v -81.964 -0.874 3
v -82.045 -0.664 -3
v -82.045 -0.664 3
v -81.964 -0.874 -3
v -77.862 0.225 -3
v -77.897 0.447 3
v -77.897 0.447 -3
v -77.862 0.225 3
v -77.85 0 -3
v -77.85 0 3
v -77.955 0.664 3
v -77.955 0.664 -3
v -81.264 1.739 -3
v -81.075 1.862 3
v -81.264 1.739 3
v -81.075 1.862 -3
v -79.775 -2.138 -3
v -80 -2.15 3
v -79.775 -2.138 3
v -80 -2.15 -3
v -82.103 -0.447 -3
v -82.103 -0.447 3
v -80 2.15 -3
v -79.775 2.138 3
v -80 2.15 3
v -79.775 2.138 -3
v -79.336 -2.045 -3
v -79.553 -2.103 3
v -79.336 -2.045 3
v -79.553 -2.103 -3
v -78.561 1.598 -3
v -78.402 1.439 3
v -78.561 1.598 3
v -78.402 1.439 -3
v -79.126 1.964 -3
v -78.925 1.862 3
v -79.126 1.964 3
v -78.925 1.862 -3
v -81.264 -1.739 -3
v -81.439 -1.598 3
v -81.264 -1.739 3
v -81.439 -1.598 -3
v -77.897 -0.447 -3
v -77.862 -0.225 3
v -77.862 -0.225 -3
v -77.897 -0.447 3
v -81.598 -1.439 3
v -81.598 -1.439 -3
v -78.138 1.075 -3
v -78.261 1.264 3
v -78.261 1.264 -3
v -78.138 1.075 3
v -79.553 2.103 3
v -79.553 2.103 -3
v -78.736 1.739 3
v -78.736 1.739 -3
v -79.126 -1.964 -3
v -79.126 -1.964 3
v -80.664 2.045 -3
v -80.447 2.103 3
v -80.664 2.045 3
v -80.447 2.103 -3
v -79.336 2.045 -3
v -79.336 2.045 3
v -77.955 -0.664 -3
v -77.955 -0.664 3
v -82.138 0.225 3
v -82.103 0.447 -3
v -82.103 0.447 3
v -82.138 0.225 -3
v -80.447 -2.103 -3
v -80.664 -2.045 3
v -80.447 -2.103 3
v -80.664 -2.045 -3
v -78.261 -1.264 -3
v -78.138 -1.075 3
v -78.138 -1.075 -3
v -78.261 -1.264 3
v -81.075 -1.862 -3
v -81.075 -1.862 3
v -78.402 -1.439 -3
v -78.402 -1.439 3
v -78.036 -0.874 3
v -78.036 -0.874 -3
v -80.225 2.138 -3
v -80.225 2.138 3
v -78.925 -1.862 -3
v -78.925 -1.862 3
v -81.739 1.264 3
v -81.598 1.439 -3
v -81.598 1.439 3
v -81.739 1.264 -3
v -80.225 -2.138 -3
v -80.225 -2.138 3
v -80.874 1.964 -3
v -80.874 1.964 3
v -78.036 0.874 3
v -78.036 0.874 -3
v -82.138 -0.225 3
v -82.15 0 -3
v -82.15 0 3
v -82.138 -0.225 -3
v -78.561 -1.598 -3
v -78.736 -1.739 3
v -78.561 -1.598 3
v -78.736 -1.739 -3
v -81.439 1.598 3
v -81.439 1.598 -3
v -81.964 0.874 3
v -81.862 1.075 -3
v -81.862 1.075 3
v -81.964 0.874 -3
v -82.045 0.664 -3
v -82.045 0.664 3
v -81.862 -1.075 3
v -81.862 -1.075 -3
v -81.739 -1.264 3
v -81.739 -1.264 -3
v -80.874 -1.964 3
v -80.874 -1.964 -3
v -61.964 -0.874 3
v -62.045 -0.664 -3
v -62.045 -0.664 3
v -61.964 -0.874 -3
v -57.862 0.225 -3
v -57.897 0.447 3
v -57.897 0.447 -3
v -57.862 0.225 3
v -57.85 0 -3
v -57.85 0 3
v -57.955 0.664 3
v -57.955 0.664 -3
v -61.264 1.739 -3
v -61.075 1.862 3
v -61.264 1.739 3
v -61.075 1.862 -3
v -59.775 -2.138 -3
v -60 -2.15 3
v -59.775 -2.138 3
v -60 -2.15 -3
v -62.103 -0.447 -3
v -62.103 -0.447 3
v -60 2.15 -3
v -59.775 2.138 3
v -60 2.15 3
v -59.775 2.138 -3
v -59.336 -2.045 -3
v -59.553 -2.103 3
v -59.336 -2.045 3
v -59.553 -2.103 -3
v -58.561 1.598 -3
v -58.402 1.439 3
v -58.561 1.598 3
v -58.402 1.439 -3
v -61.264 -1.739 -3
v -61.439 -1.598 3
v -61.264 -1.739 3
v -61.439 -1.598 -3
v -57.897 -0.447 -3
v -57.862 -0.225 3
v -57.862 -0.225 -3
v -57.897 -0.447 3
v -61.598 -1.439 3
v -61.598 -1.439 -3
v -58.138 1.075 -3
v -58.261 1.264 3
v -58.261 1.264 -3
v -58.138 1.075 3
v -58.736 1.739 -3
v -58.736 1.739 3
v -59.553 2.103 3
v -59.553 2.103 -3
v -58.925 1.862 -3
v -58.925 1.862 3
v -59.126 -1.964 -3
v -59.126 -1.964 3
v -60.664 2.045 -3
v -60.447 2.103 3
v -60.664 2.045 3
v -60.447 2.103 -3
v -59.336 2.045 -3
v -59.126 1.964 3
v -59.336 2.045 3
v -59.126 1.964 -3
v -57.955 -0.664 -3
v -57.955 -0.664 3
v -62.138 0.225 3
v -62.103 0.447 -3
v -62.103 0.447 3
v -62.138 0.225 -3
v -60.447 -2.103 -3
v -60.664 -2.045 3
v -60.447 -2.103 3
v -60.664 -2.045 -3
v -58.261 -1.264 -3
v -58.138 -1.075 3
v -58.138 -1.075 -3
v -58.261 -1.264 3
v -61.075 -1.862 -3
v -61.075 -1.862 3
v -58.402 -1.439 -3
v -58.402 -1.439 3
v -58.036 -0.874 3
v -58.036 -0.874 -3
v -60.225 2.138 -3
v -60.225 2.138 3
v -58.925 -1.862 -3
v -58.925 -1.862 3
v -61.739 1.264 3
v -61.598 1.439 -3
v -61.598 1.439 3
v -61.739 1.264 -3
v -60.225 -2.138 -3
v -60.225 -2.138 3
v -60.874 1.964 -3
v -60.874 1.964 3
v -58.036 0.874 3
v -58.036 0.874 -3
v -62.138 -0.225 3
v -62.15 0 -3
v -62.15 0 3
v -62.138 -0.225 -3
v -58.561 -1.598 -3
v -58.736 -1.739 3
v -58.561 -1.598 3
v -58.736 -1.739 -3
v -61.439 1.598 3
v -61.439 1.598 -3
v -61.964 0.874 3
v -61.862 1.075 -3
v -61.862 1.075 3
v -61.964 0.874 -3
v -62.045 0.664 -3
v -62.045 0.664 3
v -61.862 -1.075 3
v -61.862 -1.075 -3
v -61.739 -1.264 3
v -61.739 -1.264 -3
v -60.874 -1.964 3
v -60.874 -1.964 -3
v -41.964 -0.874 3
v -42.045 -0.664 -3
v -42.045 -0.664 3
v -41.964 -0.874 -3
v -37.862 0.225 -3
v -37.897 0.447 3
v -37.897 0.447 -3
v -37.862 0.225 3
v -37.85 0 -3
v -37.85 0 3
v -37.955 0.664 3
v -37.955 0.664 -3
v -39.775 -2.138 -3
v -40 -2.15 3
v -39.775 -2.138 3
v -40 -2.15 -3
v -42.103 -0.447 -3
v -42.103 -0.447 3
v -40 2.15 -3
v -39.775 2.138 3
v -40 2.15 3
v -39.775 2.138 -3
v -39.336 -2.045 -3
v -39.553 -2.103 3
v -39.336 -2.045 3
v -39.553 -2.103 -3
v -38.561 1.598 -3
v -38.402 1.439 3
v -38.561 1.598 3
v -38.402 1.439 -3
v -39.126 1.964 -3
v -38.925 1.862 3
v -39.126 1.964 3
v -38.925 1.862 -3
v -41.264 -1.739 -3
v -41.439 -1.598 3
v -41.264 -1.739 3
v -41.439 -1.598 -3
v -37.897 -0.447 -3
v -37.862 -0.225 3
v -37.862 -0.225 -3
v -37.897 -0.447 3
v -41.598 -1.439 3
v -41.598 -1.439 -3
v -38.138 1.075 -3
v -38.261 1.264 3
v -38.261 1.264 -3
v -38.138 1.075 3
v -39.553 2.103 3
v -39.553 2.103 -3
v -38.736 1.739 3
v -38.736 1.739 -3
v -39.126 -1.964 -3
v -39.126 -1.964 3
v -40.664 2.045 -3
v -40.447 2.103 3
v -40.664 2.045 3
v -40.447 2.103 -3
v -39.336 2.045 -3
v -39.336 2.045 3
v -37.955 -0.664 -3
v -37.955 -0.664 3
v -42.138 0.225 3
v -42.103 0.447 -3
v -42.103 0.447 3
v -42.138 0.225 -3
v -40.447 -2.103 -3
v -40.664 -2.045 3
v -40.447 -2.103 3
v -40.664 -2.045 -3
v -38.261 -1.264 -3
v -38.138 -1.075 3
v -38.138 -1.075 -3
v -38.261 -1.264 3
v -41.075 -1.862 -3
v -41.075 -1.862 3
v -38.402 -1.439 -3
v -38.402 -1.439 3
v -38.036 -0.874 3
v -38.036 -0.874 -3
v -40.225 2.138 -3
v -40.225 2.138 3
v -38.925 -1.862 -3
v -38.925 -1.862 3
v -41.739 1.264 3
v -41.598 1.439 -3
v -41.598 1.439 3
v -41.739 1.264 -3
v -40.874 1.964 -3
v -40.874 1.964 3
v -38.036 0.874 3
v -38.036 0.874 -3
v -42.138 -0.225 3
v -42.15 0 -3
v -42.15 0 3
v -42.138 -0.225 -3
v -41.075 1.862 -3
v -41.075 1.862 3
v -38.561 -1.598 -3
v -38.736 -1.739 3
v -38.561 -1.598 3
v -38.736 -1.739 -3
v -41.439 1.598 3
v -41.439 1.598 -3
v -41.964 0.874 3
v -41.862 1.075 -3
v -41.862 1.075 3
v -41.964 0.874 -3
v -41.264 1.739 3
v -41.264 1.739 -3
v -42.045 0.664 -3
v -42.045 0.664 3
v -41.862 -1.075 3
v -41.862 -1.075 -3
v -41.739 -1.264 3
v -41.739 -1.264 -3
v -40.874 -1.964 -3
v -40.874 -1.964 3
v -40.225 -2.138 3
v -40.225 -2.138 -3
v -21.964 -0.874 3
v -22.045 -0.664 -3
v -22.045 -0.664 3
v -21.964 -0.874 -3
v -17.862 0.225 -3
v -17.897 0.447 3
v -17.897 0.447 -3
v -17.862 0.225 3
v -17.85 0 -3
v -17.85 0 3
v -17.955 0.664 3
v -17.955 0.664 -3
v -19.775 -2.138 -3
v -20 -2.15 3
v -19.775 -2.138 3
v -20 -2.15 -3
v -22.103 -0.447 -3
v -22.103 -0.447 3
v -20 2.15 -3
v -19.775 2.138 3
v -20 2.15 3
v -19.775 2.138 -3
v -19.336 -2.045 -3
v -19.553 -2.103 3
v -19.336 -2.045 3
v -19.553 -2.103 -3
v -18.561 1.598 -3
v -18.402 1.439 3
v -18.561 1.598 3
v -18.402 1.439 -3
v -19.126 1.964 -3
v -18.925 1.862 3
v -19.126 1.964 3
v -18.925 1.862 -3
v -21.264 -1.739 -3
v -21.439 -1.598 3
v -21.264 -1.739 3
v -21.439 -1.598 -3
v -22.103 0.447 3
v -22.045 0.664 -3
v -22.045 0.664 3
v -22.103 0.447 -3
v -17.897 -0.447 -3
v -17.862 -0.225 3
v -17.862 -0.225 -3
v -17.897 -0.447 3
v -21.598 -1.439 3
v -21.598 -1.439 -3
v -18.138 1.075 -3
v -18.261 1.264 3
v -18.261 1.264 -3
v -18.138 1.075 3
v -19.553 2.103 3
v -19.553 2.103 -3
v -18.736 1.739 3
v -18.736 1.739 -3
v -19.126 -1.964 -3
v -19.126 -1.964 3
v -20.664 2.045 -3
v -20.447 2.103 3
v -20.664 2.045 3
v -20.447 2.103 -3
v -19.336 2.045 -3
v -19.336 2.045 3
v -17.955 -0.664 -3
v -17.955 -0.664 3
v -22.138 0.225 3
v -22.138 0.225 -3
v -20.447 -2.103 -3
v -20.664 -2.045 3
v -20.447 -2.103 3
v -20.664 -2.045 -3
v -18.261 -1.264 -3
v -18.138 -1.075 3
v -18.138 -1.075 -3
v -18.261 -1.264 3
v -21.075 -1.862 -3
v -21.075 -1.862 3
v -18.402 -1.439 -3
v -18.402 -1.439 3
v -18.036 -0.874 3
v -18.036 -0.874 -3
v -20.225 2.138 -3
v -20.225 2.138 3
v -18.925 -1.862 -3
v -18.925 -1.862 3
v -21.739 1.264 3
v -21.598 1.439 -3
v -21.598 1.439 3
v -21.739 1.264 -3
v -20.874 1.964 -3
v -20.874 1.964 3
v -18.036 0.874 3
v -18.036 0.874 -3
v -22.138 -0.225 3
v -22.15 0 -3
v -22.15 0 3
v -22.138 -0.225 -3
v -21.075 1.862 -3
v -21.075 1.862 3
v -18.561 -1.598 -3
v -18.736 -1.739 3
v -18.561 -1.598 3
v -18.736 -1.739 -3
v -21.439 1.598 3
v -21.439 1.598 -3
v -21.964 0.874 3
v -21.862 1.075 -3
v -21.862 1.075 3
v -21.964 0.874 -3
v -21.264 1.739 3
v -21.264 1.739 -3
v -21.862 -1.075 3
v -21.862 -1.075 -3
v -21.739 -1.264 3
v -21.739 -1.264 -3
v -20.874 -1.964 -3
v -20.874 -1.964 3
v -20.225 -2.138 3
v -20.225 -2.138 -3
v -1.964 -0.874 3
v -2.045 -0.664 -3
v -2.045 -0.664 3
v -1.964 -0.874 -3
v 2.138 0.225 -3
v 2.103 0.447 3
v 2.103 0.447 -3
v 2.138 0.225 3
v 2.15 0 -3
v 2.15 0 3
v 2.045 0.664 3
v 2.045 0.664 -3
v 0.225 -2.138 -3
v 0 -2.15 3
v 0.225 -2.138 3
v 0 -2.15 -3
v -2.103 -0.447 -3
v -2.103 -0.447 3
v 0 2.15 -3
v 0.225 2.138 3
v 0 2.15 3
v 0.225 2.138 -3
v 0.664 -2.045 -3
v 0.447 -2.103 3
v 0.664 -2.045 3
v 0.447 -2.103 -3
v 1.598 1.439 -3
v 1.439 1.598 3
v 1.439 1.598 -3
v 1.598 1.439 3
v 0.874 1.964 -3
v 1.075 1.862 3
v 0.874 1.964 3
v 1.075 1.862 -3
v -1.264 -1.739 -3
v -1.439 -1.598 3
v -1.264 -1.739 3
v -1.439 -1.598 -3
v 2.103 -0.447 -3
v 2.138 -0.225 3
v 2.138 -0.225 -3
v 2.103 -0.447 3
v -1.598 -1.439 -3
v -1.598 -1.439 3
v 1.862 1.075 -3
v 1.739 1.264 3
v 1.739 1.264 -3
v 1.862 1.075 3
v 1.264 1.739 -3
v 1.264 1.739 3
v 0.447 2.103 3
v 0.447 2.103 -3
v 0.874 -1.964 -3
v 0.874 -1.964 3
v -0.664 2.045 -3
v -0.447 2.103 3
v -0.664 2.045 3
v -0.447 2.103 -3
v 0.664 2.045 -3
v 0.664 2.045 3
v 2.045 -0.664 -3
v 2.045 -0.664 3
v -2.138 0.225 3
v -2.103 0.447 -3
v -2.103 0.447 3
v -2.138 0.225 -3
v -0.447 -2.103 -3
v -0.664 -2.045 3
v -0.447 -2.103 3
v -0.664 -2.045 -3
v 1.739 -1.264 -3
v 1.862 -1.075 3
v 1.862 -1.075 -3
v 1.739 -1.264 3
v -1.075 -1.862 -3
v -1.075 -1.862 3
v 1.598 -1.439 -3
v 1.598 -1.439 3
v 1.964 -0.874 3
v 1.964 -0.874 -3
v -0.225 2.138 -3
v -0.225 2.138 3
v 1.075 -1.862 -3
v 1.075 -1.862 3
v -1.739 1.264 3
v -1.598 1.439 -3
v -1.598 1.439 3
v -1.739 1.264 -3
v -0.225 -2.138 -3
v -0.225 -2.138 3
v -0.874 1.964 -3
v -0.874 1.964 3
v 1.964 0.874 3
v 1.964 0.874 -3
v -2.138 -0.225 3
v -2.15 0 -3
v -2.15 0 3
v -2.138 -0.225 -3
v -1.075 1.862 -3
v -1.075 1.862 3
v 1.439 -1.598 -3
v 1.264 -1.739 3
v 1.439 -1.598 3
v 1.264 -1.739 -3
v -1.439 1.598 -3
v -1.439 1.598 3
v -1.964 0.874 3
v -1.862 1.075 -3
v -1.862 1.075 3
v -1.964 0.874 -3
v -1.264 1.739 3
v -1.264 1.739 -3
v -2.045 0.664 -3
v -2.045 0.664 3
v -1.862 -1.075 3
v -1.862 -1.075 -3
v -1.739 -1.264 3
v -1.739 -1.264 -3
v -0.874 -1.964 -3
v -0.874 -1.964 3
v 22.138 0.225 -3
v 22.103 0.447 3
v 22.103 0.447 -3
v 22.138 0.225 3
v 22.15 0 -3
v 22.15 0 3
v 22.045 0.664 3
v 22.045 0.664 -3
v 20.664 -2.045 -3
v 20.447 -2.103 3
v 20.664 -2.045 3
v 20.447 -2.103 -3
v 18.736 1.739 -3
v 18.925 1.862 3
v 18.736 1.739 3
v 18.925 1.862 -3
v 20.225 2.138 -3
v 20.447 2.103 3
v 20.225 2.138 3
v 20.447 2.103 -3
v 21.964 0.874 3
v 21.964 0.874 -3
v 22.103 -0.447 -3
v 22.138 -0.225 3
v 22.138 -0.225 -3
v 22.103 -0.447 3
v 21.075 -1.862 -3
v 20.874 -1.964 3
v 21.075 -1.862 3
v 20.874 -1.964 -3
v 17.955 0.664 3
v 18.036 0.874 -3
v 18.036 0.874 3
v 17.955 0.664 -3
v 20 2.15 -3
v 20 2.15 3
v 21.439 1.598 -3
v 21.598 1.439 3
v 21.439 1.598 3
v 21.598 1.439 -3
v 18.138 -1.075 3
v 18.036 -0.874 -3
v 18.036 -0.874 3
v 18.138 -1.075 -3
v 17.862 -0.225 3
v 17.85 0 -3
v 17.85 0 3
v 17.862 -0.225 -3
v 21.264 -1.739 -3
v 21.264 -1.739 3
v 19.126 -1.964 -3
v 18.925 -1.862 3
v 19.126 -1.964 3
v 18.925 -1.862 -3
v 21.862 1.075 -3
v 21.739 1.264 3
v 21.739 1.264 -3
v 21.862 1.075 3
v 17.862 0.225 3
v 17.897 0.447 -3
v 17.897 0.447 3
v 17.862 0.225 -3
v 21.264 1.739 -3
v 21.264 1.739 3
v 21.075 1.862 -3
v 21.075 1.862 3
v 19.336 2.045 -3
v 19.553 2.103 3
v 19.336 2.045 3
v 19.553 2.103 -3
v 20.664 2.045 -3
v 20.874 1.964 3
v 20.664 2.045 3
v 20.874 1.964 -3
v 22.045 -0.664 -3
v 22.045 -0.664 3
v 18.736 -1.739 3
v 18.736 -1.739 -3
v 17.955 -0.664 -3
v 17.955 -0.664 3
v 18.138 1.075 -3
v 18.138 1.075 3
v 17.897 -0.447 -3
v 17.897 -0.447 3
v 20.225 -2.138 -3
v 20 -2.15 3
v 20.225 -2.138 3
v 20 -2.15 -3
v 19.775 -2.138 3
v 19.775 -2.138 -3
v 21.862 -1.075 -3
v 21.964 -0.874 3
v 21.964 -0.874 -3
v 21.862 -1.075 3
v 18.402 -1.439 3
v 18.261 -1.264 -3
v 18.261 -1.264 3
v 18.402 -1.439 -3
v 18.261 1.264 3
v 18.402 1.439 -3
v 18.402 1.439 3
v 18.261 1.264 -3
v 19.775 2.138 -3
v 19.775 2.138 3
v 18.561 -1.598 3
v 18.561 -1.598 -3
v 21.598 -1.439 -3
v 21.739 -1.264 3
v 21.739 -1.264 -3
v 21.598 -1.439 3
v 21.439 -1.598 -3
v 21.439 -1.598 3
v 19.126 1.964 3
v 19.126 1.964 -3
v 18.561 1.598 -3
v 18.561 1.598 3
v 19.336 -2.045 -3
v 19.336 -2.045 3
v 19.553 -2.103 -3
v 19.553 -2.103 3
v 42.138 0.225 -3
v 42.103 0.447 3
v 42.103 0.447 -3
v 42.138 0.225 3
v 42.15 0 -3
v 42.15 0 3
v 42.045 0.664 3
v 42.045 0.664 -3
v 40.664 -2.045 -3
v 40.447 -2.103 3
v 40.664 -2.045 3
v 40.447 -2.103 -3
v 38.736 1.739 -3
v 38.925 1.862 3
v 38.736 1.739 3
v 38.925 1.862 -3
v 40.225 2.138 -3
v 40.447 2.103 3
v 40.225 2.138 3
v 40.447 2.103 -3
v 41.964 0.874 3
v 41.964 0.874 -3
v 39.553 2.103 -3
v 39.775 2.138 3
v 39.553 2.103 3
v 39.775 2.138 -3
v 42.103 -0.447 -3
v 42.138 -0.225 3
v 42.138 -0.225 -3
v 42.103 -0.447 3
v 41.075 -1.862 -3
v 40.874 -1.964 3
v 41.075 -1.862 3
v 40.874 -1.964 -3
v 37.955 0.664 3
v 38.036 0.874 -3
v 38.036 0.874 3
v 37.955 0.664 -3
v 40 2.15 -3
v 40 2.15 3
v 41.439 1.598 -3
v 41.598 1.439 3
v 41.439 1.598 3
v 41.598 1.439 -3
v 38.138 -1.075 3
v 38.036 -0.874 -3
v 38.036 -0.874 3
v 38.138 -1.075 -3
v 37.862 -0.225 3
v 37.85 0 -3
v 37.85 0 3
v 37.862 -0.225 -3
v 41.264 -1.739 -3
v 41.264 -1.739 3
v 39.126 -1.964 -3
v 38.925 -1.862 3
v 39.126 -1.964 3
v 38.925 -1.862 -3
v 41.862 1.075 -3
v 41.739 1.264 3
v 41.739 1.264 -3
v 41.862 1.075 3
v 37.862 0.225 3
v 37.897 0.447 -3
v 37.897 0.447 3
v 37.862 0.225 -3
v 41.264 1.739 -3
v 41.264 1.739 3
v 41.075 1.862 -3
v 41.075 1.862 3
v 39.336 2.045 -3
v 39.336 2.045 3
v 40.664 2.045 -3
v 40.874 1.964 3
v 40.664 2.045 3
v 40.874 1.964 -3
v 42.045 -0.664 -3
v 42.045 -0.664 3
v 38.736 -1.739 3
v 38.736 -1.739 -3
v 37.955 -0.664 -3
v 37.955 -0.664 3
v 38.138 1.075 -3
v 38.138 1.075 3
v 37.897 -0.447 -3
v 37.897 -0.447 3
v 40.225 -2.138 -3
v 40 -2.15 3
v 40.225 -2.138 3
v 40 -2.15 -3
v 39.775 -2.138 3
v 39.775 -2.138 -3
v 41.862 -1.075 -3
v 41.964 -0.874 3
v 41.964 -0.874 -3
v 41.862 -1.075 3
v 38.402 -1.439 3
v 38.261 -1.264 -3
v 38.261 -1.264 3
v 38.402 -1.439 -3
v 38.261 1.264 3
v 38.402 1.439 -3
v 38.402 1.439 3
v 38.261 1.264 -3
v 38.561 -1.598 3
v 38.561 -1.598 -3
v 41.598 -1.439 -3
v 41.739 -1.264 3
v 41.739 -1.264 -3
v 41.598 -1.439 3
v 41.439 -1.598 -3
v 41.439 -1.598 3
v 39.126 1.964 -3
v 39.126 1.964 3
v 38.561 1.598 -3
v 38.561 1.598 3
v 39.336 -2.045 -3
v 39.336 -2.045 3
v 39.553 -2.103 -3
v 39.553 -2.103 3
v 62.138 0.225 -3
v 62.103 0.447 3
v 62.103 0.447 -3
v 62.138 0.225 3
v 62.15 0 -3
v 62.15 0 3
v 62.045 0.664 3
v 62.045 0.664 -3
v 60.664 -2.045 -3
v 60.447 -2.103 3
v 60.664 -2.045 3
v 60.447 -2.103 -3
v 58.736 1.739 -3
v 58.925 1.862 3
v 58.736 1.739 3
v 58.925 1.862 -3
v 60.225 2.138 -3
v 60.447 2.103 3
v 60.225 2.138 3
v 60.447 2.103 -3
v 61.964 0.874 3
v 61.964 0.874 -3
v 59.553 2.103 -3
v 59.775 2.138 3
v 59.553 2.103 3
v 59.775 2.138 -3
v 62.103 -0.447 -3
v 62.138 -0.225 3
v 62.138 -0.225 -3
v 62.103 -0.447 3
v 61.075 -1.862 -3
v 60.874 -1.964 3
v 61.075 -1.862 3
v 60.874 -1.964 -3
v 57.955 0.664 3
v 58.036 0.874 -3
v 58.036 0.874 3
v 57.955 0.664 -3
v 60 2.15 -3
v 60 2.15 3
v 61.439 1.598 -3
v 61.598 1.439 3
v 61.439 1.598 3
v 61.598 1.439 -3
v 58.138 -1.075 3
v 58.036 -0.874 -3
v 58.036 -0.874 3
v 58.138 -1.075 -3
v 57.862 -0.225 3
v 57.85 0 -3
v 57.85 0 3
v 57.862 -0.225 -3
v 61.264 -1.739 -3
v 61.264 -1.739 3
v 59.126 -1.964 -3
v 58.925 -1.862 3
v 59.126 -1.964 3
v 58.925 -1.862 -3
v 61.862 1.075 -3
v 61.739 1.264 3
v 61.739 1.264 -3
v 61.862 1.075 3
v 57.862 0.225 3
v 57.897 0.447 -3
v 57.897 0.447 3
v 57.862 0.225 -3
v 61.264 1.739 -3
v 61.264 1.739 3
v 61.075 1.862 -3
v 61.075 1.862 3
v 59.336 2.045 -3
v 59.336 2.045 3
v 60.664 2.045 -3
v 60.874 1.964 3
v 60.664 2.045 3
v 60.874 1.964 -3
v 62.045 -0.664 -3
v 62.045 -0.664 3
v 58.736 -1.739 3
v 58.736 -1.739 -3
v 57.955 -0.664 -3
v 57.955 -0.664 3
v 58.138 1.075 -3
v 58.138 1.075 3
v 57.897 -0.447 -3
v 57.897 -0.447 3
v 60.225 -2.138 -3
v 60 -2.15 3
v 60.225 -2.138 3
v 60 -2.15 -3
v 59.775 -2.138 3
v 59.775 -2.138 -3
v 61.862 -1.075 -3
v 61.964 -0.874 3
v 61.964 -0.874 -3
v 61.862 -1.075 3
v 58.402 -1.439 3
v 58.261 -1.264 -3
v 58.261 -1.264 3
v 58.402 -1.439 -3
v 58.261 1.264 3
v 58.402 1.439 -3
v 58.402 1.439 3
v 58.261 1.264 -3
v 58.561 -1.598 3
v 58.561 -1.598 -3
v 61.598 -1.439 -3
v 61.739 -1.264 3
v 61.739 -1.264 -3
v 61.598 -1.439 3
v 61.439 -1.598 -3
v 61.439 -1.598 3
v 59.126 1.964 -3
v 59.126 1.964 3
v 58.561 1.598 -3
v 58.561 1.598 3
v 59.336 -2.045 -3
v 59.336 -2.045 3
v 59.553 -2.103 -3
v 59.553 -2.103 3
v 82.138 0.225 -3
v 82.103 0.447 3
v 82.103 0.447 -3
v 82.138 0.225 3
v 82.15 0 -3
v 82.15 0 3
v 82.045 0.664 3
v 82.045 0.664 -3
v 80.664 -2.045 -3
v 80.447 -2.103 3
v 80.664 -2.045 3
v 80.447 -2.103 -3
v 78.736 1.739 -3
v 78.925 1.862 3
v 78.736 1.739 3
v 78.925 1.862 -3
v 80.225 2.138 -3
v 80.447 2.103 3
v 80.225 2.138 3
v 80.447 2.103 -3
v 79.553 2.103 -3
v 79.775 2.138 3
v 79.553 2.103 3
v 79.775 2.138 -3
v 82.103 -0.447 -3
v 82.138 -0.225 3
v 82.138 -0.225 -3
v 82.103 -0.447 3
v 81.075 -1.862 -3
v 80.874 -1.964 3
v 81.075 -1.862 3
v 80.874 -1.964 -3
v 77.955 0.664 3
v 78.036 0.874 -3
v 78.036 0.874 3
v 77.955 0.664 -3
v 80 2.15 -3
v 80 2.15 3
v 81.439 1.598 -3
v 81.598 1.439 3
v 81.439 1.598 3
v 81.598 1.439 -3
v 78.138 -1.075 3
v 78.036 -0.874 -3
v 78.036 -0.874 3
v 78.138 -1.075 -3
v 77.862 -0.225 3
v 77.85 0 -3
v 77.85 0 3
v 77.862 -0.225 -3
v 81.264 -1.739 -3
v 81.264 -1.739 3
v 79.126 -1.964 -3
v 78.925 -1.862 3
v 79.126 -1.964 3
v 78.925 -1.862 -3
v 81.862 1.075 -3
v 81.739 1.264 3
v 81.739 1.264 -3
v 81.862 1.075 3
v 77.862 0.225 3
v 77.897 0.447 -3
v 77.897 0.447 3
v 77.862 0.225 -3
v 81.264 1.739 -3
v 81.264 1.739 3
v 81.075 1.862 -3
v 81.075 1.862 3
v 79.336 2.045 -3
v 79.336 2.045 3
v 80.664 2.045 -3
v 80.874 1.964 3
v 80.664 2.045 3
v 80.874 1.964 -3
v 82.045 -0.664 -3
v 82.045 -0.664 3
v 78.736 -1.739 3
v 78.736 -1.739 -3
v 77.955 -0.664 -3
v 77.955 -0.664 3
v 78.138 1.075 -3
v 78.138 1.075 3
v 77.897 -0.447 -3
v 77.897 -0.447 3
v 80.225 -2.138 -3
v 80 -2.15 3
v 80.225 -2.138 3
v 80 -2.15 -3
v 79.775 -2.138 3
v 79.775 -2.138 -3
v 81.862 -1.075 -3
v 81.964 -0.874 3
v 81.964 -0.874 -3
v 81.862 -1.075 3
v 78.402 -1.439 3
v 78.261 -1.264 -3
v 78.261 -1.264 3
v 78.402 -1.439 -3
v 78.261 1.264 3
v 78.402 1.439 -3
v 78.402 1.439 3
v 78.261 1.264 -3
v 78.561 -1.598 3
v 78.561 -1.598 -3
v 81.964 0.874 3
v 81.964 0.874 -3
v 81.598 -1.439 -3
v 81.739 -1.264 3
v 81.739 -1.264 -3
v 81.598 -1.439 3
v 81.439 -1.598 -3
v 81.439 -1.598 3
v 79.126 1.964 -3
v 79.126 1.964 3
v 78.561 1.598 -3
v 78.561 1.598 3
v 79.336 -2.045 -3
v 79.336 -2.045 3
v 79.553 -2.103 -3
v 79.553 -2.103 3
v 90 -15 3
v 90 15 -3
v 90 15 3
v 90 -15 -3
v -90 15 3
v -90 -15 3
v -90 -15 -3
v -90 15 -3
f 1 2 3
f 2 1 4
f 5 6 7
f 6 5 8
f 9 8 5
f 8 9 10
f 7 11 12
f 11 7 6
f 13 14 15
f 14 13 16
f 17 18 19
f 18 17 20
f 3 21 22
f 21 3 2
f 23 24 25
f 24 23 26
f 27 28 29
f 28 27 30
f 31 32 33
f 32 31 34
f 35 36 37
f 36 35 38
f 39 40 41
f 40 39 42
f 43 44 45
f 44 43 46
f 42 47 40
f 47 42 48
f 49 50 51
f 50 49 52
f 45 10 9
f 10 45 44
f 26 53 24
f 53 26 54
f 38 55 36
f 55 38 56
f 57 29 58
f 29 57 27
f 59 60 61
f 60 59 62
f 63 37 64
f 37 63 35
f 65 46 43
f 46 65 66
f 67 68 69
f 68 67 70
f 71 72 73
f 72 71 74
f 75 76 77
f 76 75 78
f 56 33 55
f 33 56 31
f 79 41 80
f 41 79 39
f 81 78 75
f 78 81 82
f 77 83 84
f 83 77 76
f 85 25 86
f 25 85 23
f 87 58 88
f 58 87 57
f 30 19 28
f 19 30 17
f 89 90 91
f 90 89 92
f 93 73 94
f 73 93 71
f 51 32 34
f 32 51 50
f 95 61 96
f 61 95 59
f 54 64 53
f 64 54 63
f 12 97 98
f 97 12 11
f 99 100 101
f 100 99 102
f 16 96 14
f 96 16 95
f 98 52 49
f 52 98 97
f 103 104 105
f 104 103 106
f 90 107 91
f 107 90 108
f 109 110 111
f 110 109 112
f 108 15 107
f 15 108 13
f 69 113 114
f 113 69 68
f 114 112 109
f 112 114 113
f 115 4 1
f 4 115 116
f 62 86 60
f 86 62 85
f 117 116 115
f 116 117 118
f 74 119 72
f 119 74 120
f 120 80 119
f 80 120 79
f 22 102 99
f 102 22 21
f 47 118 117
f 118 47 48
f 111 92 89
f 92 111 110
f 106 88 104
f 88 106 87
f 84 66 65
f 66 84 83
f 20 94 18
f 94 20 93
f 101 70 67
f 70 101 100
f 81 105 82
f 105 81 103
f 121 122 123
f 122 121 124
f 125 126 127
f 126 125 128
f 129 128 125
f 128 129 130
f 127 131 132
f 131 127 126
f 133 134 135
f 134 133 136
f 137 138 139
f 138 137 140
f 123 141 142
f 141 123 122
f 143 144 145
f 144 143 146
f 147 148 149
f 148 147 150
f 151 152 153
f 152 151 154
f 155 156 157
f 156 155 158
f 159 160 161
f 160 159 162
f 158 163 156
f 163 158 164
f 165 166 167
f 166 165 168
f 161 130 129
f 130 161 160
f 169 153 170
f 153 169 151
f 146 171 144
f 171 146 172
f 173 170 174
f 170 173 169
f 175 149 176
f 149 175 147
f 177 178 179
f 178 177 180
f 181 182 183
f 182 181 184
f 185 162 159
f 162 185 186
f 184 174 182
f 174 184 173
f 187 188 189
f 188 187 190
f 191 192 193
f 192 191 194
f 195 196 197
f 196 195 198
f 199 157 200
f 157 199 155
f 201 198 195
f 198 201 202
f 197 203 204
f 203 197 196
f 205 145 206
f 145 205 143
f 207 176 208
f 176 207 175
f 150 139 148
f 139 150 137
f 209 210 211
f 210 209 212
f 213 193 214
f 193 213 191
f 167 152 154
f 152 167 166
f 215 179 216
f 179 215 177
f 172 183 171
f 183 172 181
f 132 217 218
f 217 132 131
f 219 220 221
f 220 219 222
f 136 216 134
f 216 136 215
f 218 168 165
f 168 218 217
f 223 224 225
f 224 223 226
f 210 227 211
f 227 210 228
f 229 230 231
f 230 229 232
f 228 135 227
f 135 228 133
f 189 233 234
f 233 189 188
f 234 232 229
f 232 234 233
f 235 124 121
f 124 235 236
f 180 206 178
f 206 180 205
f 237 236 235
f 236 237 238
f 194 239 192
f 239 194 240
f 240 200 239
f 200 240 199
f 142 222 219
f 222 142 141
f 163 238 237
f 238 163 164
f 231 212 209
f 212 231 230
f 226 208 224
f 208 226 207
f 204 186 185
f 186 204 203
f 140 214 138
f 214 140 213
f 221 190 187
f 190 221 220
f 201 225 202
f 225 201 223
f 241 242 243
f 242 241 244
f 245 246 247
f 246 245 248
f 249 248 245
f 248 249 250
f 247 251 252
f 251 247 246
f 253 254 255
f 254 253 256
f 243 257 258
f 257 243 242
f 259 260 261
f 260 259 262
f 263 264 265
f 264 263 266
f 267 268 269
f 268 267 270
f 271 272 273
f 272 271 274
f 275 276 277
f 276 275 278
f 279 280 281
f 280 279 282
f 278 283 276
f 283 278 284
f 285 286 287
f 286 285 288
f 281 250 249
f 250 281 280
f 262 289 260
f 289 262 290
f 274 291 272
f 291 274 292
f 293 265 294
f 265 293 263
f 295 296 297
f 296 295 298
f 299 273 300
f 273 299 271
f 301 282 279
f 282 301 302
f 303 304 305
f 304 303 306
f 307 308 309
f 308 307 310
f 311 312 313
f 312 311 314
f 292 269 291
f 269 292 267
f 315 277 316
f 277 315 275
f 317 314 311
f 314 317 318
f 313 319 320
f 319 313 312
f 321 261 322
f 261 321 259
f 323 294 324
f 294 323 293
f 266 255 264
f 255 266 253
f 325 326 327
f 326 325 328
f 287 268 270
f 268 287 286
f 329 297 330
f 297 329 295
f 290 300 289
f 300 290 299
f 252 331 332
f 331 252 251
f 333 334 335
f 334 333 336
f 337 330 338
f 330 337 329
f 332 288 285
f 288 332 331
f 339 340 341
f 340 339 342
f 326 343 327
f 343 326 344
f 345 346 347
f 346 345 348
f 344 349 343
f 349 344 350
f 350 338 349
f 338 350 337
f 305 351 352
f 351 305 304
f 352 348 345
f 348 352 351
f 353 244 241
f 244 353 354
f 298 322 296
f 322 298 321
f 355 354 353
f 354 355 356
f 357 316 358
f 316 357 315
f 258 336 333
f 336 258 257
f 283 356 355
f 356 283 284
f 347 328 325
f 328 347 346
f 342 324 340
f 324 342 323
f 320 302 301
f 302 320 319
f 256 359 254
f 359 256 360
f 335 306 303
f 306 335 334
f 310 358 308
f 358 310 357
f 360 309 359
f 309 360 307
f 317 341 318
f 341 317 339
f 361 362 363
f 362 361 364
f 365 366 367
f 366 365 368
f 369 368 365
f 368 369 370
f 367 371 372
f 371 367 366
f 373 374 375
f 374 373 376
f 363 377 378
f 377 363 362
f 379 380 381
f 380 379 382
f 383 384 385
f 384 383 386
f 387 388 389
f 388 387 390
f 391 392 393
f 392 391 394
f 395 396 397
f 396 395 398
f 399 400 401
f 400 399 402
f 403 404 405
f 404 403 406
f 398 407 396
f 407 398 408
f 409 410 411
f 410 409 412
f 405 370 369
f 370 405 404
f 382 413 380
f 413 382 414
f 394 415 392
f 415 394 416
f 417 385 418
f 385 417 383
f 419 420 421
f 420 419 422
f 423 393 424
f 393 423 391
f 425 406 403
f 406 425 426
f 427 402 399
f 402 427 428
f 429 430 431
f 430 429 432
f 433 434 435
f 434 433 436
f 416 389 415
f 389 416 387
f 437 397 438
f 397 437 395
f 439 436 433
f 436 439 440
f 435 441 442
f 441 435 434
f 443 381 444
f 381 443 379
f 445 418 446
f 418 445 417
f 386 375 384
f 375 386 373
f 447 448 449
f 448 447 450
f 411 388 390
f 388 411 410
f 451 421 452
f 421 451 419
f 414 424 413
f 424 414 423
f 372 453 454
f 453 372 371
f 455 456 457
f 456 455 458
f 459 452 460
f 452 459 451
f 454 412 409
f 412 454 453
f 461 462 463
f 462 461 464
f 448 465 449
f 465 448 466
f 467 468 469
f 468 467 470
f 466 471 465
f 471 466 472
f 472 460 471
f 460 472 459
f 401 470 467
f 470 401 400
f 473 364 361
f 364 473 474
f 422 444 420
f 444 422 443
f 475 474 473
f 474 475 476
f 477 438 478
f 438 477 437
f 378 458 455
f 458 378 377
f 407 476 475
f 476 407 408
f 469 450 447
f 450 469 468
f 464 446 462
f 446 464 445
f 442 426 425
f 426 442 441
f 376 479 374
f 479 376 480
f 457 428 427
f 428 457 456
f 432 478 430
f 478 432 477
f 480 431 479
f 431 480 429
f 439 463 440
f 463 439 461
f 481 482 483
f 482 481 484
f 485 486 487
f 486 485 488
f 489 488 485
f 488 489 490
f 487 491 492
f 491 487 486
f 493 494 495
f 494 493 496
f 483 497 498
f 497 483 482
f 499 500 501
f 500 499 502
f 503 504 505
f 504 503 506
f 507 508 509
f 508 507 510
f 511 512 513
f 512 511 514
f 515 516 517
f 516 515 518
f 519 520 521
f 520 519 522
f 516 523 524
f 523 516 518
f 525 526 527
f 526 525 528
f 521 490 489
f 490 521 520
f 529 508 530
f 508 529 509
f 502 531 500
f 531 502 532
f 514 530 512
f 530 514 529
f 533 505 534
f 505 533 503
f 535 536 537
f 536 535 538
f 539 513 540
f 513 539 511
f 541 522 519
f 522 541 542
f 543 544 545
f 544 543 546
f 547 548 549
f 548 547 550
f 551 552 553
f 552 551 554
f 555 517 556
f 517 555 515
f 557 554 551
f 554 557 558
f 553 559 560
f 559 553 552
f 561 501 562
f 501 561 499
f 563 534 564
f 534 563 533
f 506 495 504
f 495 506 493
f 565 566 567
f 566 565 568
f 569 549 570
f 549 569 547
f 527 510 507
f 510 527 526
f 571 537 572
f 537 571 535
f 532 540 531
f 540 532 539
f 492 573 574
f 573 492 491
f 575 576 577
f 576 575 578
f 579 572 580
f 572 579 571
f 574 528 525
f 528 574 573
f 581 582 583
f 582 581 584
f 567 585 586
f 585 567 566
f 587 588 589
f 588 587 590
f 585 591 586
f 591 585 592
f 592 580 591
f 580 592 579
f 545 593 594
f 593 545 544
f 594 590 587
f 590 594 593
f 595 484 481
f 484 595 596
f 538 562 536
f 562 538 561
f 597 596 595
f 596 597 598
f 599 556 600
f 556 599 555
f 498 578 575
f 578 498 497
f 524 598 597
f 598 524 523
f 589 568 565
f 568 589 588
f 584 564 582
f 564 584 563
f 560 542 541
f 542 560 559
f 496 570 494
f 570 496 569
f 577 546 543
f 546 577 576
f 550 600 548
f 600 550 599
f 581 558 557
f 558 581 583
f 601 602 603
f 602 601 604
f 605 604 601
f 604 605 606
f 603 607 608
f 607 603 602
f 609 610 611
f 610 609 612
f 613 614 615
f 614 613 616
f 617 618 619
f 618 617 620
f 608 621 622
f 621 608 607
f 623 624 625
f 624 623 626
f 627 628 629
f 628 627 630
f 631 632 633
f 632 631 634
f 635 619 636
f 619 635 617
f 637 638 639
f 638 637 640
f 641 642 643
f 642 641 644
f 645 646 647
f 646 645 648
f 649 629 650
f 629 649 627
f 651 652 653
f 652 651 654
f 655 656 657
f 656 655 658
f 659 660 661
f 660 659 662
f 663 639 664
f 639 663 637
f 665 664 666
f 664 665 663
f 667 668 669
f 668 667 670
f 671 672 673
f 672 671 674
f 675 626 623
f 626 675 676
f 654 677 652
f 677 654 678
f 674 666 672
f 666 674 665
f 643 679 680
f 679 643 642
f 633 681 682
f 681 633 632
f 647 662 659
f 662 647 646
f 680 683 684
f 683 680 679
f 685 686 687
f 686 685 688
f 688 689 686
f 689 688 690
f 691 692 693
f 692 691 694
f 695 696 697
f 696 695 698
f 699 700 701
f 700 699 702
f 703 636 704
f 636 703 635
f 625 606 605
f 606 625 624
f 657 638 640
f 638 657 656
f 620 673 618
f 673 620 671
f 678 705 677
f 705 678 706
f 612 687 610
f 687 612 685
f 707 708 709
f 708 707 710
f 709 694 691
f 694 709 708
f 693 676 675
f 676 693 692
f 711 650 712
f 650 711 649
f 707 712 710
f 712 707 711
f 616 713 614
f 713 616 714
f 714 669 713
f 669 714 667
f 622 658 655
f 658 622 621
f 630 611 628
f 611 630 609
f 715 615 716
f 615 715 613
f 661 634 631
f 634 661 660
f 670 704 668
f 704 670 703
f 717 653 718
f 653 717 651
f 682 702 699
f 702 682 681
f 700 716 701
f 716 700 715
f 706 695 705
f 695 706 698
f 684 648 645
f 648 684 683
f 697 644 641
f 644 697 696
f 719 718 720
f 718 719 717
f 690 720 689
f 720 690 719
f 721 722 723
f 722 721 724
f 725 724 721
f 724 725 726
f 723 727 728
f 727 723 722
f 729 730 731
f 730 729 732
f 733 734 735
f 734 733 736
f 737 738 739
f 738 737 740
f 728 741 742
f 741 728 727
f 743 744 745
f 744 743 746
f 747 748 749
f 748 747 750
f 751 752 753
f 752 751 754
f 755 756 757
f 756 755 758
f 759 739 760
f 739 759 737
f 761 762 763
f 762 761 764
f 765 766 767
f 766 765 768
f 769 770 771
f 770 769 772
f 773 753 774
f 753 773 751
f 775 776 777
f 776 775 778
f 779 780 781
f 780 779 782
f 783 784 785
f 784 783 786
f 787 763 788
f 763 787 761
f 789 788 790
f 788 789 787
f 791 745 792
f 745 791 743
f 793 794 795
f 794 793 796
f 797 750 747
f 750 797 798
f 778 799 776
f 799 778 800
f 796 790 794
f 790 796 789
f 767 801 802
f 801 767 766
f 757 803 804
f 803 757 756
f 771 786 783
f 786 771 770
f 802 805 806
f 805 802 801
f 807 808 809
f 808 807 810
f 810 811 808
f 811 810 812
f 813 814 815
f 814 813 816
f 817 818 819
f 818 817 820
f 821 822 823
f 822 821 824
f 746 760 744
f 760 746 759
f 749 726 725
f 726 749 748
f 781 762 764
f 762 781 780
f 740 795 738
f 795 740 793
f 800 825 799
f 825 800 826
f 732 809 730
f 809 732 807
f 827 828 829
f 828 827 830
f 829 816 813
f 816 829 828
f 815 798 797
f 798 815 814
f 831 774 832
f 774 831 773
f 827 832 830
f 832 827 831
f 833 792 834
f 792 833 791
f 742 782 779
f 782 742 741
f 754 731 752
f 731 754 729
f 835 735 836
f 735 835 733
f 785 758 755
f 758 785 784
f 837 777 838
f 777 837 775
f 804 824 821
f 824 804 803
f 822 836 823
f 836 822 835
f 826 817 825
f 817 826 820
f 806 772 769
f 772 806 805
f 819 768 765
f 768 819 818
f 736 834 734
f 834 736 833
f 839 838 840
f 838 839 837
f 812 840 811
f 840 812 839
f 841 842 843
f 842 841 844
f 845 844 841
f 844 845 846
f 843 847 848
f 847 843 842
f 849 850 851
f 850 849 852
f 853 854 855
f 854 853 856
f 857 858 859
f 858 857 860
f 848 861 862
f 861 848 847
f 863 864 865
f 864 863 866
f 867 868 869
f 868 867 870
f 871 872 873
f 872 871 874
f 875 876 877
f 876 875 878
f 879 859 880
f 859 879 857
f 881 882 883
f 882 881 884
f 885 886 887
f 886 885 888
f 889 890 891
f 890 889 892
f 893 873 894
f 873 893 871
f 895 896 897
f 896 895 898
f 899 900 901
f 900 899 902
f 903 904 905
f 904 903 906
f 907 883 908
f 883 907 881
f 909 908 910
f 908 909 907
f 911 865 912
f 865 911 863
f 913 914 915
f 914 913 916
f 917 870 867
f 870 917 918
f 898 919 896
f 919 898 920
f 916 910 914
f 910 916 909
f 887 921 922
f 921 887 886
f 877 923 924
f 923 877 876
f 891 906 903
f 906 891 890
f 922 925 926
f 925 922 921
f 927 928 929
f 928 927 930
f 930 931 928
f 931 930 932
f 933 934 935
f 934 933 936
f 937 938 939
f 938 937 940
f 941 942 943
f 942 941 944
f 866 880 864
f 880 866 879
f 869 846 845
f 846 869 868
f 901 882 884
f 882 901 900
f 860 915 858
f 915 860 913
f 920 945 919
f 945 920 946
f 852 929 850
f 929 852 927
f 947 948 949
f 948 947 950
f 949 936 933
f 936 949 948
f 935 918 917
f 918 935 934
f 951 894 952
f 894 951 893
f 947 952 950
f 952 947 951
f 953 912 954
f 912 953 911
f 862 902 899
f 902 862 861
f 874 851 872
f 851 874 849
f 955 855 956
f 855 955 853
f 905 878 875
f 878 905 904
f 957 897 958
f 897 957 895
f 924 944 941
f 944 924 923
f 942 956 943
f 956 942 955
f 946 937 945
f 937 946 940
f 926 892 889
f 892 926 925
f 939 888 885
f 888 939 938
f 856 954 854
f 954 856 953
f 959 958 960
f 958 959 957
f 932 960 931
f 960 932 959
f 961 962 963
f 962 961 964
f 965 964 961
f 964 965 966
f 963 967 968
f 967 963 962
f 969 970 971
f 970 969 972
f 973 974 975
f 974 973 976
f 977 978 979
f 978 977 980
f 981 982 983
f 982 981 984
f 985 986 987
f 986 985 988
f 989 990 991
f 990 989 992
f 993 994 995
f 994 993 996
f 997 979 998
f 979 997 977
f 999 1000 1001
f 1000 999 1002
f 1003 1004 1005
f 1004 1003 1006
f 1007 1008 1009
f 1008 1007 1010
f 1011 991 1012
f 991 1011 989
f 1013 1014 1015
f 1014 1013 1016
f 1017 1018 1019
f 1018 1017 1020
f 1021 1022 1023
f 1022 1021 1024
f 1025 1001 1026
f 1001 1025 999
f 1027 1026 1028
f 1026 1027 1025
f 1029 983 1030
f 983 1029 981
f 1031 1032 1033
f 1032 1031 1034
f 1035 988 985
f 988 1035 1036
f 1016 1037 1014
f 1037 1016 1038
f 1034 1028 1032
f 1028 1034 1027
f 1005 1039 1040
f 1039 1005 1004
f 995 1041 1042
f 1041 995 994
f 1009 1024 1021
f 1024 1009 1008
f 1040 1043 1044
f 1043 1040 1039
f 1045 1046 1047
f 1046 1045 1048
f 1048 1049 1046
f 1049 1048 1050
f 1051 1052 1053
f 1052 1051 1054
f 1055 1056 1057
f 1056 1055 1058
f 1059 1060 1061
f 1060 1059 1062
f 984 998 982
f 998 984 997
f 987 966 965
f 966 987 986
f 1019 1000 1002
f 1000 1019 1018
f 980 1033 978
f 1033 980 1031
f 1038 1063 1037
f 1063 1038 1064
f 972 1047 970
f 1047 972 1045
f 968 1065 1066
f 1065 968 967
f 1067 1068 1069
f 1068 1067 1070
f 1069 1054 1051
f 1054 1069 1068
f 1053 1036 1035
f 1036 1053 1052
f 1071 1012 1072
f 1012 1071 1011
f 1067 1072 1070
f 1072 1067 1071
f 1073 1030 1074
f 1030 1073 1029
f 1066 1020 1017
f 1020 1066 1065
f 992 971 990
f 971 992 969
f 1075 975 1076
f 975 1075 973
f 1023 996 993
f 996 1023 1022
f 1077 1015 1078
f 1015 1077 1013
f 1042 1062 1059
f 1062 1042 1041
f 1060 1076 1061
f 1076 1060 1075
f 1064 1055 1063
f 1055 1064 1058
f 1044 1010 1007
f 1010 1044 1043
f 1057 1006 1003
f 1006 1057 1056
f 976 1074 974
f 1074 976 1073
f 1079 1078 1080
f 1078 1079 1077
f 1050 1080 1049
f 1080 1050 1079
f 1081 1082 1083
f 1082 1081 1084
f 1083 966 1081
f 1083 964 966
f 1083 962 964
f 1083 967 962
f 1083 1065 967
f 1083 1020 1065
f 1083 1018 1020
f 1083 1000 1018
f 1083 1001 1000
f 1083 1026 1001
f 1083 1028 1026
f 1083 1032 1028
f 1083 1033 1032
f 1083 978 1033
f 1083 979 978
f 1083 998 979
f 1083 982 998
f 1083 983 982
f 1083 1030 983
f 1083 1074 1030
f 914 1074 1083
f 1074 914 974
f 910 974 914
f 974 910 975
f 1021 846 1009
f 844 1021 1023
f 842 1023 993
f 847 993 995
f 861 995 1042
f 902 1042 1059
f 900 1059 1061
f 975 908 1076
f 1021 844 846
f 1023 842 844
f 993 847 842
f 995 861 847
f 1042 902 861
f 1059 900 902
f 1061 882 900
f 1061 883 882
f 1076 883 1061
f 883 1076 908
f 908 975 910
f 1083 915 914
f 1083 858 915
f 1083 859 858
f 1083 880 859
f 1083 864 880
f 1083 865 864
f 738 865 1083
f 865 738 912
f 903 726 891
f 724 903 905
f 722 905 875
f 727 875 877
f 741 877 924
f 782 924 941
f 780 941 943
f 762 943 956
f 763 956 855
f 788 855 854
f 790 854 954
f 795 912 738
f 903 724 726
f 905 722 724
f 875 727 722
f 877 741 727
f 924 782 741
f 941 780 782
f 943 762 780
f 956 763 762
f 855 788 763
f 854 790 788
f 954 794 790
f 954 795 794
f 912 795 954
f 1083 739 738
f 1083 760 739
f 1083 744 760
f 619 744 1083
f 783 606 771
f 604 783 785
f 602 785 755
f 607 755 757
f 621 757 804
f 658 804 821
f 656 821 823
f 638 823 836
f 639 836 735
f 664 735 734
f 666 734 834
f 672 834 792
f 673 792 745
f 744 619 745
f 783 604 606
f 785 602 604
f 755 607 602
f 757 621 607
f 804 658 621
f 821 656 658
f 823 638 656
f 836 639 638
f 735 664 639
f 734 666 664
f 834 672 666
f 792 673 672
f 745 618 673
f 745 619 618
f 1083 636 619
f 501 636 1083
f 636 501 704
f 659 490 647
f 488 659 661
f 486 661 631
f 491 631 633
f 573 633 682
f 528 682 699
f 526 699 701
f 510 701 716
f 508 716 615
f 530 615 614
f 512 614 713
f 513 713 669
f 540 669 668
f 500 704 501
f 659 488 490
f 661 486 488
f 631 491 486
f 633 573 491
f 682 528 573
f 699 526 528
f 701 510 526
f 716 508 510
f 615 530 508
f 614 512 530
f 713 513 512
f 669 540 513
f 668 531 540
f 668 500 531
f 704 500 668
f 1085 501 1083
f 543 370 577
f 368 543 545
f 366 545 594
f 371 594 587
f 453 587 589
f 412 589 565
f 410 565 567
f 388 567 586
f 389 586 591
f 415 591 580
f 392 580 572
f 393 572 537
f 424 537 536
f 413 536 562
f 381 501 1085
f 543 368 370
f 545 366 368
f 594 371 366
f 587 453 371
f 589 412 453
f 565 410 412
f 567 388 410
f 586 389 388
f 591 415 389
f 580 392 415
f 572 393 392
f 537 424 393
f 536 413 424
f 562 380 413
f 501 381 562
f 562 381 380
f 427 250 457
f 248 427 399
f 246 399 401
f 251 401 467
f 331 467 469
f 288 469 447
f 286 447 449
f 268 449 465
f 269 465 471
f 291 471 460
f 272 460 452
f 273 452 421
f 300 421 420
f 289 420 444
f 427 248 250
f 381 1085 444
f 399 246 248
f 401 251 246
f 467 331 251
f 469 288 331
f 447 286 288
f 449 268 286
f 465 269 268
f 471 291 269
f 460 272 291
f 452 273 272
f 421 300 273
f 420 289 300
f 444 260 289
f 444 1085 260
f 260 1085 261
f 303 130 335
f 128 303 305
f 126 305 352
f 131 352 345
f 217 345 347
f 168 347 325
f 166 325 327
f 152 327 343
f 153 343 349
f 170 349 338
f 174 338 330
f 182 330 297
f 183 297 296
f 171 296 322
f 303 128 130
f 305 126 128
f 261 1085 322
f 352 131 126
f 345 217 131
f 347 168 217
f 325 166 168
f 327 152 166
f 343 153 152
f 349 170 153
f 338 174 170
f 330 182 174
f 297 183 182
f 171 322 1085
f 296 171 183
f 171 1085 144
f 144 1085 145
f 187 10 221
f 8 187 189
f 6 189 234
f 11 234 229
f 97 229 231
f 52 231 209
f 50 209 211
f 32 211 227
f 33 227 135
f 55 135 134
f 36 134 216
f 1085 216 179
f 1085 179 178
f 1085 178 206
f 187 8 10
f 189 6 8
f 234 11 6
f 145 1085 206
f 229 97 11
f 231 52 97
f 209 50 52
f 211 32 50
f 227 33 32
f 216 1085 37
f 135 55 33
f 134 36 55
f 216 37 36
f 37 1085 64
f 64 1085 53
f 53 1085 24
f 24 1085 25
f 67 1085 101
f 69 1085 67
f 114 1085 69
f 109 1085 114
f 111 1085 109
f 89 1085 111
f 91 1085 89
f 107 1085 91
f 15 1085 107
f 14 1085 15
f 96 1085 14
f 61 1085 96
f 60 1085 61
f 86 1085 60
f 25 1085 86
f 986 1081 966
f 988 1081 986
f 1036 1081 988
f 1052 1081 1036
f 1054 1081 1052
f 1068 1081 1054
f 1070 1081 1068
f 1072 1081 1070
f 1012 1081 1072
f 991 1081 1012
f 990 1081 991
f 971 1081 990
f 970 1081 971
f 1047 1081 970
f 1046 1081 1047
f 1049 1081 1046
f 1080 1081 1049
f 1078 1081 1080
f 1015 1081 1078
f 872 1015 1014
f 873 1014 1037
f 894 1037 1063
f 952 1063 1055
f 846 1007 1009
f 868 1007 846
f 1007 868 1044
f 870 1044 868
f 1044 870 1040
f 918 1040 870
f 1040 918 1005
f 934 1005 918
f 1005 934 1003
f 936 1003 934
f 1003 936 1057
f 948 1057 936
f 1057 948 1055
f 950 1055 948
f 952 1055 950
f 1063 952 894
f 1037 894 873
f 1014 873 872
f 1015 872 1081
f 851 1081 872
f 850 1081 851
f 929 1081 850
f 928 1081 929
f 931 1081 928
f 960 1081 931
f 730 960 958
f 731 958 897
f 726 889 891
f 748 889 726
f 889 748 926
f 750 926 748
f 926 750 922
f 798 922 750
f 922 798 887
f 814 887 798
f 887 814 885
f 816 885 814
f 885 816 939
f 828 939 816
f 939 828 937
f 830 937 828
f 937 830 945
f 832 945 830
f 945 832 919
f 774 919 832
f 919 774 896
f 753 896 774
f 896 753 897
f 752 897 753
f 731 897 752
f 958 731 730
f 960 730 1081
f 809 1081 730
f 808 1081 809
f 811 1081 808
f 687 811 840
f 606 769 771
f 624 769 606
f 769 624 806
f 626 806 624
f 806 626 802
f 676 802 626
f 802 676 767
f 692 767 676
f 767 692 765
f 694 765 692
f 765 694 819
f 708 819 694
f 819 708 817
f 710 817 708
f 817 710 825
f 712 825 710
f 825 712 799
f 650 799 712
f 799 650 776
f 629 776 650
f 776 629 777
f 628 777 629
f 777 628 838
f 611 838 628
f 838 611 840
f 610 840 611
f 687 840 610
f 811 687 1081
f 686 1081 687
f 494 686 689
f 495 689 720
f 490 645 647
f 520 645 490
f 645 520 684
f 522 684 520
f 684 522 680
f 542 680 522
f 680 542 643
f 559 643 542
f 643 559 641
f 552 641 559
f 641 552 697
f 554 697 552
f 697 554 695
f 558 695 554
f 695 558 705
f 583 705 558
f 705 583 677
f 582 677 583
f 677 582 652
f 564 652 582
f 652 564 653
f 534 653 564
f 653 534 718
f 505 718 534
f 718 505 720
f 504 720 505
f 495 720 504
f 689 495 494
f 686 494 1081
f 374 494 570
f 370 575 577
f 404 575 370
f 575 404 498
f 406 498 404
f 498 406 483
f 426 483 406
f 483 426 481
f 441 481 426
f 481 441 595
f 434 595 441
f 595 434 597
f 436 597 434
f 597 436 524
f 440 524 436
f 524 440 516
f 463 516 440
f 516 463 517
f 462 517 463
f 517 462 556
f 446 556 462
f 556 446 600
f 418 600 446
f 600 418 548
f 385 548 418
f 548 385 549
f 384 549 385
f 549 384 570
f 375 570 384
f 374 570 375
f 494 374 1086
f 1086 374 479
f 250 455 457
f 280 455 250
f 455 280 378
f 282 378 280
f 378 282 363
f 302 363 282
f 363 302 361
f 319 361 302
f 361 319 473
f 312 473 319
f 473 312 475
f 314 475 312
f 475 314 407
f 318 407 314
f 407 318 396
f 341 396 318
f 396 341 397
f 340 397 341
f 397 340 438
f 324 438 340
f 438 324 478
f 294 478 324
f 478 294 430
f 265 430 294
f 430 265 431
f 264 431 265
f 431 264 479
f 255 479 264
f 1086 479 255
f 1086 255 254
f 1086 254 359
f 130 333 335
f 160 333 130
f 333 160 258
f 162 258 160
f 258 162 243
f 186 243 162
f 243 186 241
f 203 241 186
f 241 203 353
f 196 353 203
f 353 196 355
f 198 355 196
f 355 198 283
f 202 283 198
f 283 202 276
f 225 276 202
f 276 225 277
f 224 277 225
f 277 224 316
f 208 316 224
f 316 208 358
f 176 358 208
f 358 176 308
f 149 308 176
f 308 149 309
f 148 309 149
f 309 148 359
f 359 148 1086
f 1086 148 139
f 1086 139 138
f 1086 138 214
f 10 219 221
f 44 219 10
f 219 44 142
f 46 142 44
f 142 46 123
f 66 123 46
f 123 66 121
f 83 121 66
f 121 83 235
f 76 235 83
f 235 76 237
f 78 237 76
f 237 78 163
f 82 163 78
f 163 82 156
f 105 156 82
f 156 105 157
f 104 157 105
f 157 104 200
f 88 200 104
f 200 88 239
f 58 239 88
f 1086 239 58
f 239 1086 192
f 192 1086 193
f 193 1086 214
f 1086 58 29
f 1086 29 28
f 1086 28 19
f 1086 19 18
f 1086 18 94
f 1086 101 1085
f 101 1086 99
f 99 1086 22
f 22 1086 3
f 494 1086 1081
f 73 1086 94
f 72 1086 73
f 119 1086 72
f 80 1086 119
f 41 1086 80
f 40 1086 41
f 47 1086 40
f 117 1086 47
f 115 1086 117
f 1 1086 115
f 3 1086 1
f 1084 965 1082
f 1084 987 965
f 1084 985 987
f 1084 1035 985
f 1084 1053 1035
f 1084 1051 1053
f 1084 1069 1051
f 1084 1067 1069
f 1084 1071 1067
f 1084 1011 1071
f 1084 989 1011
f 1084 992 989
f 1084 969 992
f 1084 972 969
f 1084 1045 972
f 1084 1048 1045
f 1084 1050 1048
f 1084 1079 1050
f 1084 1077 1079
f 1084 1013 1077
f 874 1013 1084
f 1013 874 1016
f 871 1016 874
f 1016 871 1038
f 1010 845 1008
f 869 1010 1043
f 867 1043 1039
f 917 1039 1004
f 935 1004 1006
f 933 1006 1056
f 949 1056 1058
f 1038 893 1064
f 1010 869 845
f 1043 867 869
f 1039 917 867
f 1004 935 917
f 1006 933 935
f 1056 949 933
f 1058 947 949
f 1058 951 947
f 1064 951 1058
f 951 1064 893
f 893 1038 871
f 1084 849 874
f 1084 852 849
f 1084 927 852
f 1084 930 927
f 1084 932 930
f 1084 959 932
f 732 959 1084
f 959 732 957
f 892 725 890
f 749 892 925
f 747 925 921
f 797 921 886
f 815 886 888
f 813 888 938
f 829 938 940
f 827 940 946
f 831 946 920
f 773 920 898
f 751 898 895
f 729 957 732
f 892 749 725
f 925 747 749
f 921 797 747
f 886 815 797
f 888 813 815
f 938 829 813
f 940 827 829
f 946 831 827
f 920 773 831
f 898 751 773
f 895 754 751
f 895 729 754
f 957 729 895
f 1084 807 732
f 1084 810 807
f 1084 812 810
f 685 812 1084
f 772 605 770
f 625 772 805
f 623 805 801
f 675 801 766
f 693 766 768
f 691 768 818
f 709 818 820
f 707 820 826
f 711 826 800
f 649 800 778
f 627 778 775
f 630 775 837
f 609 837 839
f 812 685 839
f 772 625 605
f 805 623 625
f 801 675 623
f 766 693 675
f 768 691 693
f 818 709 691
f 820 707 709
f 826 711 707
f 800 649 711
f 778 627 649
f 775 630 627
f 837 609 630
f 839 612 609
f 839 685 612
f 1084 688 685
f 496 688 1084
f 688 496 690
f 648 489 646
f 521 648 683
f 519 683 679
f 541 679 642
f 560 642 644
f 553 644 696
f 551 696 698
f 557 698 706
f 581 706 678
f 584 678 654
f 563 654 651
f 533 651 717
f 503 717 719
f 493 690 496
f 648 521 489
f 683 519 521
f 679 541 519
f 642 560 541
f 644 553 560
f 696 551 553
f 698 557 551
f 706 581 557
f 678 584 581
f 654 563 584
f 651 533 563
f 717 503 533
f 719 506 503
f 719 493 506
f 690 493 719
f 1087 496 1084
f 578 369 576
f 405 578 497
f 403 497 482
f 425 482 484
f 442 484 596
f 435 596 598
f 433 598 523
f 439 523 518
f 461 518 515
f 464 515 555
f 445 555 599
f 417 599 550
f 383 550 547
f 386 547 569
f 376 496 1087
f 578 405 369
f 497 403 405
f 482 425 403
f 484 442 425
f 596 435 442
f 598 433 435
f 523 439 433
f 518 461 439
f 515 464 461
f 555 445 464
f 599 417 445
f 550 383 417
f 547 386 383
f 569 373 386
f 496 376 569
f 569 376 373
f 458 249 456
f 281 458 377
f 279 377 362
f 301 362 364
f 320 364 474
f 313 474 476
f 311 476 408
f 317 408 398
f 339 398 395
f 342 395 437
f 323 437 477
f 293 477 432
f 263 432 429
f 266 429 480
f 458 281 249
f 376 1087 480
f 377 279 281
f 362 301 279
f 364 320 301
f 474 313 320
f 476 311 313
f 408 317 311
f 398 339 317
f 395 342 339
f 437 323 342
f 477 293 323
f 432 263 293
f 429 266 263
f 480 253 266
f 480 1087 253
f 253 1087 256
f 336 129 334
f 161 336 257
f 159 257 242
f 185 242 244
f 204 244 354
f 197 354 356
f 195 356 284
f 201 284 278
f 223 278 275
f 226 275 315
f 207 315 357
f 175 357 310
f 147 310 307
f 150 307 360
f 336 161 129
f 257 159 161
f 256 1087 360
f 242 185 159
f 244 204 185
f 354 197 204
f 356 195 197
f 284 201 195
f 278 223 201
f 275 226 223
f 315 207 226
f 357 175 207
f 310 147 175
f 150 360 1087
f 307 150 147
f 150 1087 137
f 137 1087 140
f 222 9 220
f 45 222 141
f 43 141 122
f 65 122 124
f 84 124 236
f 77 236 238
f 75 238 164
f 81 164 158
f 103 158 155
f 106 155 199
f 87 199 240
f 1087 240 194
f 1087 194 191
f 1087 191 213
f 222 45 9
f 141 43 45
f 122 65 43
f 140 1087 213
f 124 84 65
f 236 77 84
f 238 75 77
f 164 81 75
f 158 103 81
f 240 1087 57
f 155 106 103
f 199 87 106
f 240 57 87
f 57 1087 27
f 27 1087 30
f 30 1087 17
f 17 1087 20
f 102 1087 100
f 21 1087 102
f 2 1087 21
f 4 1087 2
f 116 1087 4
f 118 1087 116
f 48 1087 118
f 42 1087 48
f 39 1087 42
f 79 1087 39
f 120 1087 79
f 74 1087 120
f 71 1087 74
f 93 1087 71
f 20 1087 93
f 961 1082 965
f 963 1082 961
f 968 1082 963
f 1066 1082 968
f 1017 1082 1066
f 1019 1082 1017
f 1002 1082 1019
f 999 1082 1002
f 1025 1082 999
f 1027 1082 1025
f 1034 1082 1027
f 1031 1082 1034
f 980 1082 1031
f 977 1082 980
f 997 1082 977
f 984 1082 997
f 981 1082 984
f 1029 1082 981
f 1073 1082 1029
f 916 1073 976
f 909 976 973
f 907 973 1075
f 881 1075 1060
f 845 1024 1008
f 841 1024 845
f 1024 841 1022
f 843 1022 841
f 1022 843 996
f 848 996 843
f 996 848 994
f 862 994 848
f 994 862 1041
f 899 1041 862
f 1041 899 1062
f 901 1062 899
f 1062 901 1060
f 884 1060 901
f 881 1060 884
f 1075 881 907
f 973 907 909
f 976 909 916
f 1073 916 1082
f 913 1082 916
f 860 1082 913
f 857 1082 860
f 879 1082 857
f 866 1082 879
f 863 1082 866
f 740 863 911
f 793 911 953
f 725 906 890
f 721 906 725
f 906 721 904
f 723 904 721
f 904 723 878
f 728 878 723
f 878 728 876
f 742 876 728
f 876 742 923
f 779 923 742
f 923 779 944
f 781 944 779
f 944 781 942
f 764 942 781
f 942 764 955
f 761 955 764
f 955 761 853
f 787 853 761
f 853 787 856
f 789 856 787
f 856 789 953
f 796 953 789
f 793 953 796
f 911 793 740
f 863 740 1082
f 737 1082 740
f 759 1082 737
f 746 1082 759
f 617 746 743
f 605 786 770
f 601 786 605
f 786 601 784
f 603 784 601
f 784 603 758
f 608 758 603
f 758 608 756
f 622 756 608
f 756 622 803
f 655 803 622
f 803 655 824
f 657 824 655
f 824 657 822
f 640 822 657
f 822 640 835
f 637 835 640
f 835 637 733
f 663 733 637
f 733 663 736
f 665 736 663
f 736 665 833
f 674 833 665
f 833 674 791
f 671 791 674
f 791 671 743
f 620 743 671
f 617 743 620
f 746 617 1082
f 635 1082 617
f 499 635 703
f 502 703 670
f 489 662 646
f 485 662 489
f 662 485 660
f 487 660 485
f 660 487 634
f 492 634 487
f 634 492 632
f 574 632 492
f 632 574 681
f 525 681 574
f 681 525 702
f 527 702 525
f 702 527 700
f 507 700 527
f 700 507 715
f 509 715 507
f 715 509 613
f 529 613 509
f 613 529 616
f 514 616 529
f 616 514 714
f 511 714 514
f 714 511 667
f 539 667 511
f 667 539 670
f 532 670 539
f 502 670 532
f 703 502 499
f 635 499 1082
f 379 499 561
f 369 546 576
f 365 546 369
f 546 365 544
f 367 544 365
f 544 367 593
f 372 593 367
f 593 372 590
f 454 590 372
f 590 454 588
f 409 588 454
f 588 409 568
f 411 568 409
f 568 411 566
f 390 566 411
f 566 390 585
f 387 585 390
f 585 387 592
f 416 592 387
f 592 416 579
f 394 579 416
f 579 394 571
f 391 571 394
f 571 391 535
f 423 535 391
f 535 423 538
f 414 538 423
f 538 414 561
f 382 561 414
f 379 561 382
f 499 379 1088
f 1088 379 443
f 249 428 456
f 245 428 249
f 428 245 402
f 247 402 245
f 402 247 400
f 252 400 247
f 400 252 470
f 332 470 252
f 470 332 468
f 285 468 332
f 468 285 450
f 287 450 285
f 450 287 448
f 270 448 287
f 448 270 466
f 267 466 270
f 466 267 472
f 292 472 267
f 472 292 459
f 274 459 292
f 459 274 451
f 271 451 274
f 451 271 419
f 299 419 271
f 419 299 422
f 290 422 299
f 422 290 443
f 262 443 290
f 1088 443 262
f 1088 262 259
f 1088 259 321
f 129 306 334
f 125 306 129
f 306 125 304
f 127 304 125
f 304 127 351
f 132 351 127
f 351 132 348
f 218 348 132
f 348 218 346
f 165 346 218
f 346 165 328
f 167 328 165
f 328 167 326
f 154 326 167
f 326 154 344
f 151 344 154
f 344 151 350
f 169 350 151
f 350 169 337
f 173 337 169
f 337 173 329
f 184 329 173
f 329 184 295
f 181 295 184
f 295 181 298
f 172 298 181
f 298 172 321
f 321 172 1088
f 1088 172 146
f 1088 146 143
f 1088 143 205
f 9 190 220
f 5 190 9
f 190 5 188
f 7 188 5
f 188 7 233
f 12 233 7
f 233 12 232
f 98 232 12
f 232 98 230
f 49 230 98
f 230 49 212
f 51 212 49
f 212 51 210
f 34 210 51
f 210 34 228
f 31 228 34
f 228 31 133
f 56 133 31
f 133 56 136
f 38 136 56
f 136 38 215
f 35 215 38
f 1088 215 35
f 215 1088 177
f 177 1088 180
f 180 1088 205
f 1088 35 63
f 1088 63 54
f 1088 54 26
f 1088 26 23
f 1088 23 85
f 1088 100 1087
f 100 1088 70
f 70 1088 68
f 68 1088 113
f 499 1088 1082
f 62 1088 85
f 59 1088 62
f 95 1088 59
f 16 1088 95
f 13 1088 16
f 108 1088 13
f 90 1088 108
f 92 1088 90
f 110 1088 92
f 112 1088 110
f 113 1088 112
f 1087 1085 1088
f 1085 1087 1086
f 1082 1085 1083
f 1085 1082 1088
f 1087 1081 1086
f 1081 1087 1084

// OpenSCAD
// Linear rail spacer strip.
$fn = 60;
eps = 0.02;
length = 180;
width = 30;
thickness = 6;
hole_pitch = 20;
difference() {
    cube([length,width,thickness],center=true);
    for (x=[-length/2+10:hole_pitch:length/2-10]) translate([x,0,-thickness/2-eps]) cylinder(d=4.3,h=thickness+2*eps);
}
